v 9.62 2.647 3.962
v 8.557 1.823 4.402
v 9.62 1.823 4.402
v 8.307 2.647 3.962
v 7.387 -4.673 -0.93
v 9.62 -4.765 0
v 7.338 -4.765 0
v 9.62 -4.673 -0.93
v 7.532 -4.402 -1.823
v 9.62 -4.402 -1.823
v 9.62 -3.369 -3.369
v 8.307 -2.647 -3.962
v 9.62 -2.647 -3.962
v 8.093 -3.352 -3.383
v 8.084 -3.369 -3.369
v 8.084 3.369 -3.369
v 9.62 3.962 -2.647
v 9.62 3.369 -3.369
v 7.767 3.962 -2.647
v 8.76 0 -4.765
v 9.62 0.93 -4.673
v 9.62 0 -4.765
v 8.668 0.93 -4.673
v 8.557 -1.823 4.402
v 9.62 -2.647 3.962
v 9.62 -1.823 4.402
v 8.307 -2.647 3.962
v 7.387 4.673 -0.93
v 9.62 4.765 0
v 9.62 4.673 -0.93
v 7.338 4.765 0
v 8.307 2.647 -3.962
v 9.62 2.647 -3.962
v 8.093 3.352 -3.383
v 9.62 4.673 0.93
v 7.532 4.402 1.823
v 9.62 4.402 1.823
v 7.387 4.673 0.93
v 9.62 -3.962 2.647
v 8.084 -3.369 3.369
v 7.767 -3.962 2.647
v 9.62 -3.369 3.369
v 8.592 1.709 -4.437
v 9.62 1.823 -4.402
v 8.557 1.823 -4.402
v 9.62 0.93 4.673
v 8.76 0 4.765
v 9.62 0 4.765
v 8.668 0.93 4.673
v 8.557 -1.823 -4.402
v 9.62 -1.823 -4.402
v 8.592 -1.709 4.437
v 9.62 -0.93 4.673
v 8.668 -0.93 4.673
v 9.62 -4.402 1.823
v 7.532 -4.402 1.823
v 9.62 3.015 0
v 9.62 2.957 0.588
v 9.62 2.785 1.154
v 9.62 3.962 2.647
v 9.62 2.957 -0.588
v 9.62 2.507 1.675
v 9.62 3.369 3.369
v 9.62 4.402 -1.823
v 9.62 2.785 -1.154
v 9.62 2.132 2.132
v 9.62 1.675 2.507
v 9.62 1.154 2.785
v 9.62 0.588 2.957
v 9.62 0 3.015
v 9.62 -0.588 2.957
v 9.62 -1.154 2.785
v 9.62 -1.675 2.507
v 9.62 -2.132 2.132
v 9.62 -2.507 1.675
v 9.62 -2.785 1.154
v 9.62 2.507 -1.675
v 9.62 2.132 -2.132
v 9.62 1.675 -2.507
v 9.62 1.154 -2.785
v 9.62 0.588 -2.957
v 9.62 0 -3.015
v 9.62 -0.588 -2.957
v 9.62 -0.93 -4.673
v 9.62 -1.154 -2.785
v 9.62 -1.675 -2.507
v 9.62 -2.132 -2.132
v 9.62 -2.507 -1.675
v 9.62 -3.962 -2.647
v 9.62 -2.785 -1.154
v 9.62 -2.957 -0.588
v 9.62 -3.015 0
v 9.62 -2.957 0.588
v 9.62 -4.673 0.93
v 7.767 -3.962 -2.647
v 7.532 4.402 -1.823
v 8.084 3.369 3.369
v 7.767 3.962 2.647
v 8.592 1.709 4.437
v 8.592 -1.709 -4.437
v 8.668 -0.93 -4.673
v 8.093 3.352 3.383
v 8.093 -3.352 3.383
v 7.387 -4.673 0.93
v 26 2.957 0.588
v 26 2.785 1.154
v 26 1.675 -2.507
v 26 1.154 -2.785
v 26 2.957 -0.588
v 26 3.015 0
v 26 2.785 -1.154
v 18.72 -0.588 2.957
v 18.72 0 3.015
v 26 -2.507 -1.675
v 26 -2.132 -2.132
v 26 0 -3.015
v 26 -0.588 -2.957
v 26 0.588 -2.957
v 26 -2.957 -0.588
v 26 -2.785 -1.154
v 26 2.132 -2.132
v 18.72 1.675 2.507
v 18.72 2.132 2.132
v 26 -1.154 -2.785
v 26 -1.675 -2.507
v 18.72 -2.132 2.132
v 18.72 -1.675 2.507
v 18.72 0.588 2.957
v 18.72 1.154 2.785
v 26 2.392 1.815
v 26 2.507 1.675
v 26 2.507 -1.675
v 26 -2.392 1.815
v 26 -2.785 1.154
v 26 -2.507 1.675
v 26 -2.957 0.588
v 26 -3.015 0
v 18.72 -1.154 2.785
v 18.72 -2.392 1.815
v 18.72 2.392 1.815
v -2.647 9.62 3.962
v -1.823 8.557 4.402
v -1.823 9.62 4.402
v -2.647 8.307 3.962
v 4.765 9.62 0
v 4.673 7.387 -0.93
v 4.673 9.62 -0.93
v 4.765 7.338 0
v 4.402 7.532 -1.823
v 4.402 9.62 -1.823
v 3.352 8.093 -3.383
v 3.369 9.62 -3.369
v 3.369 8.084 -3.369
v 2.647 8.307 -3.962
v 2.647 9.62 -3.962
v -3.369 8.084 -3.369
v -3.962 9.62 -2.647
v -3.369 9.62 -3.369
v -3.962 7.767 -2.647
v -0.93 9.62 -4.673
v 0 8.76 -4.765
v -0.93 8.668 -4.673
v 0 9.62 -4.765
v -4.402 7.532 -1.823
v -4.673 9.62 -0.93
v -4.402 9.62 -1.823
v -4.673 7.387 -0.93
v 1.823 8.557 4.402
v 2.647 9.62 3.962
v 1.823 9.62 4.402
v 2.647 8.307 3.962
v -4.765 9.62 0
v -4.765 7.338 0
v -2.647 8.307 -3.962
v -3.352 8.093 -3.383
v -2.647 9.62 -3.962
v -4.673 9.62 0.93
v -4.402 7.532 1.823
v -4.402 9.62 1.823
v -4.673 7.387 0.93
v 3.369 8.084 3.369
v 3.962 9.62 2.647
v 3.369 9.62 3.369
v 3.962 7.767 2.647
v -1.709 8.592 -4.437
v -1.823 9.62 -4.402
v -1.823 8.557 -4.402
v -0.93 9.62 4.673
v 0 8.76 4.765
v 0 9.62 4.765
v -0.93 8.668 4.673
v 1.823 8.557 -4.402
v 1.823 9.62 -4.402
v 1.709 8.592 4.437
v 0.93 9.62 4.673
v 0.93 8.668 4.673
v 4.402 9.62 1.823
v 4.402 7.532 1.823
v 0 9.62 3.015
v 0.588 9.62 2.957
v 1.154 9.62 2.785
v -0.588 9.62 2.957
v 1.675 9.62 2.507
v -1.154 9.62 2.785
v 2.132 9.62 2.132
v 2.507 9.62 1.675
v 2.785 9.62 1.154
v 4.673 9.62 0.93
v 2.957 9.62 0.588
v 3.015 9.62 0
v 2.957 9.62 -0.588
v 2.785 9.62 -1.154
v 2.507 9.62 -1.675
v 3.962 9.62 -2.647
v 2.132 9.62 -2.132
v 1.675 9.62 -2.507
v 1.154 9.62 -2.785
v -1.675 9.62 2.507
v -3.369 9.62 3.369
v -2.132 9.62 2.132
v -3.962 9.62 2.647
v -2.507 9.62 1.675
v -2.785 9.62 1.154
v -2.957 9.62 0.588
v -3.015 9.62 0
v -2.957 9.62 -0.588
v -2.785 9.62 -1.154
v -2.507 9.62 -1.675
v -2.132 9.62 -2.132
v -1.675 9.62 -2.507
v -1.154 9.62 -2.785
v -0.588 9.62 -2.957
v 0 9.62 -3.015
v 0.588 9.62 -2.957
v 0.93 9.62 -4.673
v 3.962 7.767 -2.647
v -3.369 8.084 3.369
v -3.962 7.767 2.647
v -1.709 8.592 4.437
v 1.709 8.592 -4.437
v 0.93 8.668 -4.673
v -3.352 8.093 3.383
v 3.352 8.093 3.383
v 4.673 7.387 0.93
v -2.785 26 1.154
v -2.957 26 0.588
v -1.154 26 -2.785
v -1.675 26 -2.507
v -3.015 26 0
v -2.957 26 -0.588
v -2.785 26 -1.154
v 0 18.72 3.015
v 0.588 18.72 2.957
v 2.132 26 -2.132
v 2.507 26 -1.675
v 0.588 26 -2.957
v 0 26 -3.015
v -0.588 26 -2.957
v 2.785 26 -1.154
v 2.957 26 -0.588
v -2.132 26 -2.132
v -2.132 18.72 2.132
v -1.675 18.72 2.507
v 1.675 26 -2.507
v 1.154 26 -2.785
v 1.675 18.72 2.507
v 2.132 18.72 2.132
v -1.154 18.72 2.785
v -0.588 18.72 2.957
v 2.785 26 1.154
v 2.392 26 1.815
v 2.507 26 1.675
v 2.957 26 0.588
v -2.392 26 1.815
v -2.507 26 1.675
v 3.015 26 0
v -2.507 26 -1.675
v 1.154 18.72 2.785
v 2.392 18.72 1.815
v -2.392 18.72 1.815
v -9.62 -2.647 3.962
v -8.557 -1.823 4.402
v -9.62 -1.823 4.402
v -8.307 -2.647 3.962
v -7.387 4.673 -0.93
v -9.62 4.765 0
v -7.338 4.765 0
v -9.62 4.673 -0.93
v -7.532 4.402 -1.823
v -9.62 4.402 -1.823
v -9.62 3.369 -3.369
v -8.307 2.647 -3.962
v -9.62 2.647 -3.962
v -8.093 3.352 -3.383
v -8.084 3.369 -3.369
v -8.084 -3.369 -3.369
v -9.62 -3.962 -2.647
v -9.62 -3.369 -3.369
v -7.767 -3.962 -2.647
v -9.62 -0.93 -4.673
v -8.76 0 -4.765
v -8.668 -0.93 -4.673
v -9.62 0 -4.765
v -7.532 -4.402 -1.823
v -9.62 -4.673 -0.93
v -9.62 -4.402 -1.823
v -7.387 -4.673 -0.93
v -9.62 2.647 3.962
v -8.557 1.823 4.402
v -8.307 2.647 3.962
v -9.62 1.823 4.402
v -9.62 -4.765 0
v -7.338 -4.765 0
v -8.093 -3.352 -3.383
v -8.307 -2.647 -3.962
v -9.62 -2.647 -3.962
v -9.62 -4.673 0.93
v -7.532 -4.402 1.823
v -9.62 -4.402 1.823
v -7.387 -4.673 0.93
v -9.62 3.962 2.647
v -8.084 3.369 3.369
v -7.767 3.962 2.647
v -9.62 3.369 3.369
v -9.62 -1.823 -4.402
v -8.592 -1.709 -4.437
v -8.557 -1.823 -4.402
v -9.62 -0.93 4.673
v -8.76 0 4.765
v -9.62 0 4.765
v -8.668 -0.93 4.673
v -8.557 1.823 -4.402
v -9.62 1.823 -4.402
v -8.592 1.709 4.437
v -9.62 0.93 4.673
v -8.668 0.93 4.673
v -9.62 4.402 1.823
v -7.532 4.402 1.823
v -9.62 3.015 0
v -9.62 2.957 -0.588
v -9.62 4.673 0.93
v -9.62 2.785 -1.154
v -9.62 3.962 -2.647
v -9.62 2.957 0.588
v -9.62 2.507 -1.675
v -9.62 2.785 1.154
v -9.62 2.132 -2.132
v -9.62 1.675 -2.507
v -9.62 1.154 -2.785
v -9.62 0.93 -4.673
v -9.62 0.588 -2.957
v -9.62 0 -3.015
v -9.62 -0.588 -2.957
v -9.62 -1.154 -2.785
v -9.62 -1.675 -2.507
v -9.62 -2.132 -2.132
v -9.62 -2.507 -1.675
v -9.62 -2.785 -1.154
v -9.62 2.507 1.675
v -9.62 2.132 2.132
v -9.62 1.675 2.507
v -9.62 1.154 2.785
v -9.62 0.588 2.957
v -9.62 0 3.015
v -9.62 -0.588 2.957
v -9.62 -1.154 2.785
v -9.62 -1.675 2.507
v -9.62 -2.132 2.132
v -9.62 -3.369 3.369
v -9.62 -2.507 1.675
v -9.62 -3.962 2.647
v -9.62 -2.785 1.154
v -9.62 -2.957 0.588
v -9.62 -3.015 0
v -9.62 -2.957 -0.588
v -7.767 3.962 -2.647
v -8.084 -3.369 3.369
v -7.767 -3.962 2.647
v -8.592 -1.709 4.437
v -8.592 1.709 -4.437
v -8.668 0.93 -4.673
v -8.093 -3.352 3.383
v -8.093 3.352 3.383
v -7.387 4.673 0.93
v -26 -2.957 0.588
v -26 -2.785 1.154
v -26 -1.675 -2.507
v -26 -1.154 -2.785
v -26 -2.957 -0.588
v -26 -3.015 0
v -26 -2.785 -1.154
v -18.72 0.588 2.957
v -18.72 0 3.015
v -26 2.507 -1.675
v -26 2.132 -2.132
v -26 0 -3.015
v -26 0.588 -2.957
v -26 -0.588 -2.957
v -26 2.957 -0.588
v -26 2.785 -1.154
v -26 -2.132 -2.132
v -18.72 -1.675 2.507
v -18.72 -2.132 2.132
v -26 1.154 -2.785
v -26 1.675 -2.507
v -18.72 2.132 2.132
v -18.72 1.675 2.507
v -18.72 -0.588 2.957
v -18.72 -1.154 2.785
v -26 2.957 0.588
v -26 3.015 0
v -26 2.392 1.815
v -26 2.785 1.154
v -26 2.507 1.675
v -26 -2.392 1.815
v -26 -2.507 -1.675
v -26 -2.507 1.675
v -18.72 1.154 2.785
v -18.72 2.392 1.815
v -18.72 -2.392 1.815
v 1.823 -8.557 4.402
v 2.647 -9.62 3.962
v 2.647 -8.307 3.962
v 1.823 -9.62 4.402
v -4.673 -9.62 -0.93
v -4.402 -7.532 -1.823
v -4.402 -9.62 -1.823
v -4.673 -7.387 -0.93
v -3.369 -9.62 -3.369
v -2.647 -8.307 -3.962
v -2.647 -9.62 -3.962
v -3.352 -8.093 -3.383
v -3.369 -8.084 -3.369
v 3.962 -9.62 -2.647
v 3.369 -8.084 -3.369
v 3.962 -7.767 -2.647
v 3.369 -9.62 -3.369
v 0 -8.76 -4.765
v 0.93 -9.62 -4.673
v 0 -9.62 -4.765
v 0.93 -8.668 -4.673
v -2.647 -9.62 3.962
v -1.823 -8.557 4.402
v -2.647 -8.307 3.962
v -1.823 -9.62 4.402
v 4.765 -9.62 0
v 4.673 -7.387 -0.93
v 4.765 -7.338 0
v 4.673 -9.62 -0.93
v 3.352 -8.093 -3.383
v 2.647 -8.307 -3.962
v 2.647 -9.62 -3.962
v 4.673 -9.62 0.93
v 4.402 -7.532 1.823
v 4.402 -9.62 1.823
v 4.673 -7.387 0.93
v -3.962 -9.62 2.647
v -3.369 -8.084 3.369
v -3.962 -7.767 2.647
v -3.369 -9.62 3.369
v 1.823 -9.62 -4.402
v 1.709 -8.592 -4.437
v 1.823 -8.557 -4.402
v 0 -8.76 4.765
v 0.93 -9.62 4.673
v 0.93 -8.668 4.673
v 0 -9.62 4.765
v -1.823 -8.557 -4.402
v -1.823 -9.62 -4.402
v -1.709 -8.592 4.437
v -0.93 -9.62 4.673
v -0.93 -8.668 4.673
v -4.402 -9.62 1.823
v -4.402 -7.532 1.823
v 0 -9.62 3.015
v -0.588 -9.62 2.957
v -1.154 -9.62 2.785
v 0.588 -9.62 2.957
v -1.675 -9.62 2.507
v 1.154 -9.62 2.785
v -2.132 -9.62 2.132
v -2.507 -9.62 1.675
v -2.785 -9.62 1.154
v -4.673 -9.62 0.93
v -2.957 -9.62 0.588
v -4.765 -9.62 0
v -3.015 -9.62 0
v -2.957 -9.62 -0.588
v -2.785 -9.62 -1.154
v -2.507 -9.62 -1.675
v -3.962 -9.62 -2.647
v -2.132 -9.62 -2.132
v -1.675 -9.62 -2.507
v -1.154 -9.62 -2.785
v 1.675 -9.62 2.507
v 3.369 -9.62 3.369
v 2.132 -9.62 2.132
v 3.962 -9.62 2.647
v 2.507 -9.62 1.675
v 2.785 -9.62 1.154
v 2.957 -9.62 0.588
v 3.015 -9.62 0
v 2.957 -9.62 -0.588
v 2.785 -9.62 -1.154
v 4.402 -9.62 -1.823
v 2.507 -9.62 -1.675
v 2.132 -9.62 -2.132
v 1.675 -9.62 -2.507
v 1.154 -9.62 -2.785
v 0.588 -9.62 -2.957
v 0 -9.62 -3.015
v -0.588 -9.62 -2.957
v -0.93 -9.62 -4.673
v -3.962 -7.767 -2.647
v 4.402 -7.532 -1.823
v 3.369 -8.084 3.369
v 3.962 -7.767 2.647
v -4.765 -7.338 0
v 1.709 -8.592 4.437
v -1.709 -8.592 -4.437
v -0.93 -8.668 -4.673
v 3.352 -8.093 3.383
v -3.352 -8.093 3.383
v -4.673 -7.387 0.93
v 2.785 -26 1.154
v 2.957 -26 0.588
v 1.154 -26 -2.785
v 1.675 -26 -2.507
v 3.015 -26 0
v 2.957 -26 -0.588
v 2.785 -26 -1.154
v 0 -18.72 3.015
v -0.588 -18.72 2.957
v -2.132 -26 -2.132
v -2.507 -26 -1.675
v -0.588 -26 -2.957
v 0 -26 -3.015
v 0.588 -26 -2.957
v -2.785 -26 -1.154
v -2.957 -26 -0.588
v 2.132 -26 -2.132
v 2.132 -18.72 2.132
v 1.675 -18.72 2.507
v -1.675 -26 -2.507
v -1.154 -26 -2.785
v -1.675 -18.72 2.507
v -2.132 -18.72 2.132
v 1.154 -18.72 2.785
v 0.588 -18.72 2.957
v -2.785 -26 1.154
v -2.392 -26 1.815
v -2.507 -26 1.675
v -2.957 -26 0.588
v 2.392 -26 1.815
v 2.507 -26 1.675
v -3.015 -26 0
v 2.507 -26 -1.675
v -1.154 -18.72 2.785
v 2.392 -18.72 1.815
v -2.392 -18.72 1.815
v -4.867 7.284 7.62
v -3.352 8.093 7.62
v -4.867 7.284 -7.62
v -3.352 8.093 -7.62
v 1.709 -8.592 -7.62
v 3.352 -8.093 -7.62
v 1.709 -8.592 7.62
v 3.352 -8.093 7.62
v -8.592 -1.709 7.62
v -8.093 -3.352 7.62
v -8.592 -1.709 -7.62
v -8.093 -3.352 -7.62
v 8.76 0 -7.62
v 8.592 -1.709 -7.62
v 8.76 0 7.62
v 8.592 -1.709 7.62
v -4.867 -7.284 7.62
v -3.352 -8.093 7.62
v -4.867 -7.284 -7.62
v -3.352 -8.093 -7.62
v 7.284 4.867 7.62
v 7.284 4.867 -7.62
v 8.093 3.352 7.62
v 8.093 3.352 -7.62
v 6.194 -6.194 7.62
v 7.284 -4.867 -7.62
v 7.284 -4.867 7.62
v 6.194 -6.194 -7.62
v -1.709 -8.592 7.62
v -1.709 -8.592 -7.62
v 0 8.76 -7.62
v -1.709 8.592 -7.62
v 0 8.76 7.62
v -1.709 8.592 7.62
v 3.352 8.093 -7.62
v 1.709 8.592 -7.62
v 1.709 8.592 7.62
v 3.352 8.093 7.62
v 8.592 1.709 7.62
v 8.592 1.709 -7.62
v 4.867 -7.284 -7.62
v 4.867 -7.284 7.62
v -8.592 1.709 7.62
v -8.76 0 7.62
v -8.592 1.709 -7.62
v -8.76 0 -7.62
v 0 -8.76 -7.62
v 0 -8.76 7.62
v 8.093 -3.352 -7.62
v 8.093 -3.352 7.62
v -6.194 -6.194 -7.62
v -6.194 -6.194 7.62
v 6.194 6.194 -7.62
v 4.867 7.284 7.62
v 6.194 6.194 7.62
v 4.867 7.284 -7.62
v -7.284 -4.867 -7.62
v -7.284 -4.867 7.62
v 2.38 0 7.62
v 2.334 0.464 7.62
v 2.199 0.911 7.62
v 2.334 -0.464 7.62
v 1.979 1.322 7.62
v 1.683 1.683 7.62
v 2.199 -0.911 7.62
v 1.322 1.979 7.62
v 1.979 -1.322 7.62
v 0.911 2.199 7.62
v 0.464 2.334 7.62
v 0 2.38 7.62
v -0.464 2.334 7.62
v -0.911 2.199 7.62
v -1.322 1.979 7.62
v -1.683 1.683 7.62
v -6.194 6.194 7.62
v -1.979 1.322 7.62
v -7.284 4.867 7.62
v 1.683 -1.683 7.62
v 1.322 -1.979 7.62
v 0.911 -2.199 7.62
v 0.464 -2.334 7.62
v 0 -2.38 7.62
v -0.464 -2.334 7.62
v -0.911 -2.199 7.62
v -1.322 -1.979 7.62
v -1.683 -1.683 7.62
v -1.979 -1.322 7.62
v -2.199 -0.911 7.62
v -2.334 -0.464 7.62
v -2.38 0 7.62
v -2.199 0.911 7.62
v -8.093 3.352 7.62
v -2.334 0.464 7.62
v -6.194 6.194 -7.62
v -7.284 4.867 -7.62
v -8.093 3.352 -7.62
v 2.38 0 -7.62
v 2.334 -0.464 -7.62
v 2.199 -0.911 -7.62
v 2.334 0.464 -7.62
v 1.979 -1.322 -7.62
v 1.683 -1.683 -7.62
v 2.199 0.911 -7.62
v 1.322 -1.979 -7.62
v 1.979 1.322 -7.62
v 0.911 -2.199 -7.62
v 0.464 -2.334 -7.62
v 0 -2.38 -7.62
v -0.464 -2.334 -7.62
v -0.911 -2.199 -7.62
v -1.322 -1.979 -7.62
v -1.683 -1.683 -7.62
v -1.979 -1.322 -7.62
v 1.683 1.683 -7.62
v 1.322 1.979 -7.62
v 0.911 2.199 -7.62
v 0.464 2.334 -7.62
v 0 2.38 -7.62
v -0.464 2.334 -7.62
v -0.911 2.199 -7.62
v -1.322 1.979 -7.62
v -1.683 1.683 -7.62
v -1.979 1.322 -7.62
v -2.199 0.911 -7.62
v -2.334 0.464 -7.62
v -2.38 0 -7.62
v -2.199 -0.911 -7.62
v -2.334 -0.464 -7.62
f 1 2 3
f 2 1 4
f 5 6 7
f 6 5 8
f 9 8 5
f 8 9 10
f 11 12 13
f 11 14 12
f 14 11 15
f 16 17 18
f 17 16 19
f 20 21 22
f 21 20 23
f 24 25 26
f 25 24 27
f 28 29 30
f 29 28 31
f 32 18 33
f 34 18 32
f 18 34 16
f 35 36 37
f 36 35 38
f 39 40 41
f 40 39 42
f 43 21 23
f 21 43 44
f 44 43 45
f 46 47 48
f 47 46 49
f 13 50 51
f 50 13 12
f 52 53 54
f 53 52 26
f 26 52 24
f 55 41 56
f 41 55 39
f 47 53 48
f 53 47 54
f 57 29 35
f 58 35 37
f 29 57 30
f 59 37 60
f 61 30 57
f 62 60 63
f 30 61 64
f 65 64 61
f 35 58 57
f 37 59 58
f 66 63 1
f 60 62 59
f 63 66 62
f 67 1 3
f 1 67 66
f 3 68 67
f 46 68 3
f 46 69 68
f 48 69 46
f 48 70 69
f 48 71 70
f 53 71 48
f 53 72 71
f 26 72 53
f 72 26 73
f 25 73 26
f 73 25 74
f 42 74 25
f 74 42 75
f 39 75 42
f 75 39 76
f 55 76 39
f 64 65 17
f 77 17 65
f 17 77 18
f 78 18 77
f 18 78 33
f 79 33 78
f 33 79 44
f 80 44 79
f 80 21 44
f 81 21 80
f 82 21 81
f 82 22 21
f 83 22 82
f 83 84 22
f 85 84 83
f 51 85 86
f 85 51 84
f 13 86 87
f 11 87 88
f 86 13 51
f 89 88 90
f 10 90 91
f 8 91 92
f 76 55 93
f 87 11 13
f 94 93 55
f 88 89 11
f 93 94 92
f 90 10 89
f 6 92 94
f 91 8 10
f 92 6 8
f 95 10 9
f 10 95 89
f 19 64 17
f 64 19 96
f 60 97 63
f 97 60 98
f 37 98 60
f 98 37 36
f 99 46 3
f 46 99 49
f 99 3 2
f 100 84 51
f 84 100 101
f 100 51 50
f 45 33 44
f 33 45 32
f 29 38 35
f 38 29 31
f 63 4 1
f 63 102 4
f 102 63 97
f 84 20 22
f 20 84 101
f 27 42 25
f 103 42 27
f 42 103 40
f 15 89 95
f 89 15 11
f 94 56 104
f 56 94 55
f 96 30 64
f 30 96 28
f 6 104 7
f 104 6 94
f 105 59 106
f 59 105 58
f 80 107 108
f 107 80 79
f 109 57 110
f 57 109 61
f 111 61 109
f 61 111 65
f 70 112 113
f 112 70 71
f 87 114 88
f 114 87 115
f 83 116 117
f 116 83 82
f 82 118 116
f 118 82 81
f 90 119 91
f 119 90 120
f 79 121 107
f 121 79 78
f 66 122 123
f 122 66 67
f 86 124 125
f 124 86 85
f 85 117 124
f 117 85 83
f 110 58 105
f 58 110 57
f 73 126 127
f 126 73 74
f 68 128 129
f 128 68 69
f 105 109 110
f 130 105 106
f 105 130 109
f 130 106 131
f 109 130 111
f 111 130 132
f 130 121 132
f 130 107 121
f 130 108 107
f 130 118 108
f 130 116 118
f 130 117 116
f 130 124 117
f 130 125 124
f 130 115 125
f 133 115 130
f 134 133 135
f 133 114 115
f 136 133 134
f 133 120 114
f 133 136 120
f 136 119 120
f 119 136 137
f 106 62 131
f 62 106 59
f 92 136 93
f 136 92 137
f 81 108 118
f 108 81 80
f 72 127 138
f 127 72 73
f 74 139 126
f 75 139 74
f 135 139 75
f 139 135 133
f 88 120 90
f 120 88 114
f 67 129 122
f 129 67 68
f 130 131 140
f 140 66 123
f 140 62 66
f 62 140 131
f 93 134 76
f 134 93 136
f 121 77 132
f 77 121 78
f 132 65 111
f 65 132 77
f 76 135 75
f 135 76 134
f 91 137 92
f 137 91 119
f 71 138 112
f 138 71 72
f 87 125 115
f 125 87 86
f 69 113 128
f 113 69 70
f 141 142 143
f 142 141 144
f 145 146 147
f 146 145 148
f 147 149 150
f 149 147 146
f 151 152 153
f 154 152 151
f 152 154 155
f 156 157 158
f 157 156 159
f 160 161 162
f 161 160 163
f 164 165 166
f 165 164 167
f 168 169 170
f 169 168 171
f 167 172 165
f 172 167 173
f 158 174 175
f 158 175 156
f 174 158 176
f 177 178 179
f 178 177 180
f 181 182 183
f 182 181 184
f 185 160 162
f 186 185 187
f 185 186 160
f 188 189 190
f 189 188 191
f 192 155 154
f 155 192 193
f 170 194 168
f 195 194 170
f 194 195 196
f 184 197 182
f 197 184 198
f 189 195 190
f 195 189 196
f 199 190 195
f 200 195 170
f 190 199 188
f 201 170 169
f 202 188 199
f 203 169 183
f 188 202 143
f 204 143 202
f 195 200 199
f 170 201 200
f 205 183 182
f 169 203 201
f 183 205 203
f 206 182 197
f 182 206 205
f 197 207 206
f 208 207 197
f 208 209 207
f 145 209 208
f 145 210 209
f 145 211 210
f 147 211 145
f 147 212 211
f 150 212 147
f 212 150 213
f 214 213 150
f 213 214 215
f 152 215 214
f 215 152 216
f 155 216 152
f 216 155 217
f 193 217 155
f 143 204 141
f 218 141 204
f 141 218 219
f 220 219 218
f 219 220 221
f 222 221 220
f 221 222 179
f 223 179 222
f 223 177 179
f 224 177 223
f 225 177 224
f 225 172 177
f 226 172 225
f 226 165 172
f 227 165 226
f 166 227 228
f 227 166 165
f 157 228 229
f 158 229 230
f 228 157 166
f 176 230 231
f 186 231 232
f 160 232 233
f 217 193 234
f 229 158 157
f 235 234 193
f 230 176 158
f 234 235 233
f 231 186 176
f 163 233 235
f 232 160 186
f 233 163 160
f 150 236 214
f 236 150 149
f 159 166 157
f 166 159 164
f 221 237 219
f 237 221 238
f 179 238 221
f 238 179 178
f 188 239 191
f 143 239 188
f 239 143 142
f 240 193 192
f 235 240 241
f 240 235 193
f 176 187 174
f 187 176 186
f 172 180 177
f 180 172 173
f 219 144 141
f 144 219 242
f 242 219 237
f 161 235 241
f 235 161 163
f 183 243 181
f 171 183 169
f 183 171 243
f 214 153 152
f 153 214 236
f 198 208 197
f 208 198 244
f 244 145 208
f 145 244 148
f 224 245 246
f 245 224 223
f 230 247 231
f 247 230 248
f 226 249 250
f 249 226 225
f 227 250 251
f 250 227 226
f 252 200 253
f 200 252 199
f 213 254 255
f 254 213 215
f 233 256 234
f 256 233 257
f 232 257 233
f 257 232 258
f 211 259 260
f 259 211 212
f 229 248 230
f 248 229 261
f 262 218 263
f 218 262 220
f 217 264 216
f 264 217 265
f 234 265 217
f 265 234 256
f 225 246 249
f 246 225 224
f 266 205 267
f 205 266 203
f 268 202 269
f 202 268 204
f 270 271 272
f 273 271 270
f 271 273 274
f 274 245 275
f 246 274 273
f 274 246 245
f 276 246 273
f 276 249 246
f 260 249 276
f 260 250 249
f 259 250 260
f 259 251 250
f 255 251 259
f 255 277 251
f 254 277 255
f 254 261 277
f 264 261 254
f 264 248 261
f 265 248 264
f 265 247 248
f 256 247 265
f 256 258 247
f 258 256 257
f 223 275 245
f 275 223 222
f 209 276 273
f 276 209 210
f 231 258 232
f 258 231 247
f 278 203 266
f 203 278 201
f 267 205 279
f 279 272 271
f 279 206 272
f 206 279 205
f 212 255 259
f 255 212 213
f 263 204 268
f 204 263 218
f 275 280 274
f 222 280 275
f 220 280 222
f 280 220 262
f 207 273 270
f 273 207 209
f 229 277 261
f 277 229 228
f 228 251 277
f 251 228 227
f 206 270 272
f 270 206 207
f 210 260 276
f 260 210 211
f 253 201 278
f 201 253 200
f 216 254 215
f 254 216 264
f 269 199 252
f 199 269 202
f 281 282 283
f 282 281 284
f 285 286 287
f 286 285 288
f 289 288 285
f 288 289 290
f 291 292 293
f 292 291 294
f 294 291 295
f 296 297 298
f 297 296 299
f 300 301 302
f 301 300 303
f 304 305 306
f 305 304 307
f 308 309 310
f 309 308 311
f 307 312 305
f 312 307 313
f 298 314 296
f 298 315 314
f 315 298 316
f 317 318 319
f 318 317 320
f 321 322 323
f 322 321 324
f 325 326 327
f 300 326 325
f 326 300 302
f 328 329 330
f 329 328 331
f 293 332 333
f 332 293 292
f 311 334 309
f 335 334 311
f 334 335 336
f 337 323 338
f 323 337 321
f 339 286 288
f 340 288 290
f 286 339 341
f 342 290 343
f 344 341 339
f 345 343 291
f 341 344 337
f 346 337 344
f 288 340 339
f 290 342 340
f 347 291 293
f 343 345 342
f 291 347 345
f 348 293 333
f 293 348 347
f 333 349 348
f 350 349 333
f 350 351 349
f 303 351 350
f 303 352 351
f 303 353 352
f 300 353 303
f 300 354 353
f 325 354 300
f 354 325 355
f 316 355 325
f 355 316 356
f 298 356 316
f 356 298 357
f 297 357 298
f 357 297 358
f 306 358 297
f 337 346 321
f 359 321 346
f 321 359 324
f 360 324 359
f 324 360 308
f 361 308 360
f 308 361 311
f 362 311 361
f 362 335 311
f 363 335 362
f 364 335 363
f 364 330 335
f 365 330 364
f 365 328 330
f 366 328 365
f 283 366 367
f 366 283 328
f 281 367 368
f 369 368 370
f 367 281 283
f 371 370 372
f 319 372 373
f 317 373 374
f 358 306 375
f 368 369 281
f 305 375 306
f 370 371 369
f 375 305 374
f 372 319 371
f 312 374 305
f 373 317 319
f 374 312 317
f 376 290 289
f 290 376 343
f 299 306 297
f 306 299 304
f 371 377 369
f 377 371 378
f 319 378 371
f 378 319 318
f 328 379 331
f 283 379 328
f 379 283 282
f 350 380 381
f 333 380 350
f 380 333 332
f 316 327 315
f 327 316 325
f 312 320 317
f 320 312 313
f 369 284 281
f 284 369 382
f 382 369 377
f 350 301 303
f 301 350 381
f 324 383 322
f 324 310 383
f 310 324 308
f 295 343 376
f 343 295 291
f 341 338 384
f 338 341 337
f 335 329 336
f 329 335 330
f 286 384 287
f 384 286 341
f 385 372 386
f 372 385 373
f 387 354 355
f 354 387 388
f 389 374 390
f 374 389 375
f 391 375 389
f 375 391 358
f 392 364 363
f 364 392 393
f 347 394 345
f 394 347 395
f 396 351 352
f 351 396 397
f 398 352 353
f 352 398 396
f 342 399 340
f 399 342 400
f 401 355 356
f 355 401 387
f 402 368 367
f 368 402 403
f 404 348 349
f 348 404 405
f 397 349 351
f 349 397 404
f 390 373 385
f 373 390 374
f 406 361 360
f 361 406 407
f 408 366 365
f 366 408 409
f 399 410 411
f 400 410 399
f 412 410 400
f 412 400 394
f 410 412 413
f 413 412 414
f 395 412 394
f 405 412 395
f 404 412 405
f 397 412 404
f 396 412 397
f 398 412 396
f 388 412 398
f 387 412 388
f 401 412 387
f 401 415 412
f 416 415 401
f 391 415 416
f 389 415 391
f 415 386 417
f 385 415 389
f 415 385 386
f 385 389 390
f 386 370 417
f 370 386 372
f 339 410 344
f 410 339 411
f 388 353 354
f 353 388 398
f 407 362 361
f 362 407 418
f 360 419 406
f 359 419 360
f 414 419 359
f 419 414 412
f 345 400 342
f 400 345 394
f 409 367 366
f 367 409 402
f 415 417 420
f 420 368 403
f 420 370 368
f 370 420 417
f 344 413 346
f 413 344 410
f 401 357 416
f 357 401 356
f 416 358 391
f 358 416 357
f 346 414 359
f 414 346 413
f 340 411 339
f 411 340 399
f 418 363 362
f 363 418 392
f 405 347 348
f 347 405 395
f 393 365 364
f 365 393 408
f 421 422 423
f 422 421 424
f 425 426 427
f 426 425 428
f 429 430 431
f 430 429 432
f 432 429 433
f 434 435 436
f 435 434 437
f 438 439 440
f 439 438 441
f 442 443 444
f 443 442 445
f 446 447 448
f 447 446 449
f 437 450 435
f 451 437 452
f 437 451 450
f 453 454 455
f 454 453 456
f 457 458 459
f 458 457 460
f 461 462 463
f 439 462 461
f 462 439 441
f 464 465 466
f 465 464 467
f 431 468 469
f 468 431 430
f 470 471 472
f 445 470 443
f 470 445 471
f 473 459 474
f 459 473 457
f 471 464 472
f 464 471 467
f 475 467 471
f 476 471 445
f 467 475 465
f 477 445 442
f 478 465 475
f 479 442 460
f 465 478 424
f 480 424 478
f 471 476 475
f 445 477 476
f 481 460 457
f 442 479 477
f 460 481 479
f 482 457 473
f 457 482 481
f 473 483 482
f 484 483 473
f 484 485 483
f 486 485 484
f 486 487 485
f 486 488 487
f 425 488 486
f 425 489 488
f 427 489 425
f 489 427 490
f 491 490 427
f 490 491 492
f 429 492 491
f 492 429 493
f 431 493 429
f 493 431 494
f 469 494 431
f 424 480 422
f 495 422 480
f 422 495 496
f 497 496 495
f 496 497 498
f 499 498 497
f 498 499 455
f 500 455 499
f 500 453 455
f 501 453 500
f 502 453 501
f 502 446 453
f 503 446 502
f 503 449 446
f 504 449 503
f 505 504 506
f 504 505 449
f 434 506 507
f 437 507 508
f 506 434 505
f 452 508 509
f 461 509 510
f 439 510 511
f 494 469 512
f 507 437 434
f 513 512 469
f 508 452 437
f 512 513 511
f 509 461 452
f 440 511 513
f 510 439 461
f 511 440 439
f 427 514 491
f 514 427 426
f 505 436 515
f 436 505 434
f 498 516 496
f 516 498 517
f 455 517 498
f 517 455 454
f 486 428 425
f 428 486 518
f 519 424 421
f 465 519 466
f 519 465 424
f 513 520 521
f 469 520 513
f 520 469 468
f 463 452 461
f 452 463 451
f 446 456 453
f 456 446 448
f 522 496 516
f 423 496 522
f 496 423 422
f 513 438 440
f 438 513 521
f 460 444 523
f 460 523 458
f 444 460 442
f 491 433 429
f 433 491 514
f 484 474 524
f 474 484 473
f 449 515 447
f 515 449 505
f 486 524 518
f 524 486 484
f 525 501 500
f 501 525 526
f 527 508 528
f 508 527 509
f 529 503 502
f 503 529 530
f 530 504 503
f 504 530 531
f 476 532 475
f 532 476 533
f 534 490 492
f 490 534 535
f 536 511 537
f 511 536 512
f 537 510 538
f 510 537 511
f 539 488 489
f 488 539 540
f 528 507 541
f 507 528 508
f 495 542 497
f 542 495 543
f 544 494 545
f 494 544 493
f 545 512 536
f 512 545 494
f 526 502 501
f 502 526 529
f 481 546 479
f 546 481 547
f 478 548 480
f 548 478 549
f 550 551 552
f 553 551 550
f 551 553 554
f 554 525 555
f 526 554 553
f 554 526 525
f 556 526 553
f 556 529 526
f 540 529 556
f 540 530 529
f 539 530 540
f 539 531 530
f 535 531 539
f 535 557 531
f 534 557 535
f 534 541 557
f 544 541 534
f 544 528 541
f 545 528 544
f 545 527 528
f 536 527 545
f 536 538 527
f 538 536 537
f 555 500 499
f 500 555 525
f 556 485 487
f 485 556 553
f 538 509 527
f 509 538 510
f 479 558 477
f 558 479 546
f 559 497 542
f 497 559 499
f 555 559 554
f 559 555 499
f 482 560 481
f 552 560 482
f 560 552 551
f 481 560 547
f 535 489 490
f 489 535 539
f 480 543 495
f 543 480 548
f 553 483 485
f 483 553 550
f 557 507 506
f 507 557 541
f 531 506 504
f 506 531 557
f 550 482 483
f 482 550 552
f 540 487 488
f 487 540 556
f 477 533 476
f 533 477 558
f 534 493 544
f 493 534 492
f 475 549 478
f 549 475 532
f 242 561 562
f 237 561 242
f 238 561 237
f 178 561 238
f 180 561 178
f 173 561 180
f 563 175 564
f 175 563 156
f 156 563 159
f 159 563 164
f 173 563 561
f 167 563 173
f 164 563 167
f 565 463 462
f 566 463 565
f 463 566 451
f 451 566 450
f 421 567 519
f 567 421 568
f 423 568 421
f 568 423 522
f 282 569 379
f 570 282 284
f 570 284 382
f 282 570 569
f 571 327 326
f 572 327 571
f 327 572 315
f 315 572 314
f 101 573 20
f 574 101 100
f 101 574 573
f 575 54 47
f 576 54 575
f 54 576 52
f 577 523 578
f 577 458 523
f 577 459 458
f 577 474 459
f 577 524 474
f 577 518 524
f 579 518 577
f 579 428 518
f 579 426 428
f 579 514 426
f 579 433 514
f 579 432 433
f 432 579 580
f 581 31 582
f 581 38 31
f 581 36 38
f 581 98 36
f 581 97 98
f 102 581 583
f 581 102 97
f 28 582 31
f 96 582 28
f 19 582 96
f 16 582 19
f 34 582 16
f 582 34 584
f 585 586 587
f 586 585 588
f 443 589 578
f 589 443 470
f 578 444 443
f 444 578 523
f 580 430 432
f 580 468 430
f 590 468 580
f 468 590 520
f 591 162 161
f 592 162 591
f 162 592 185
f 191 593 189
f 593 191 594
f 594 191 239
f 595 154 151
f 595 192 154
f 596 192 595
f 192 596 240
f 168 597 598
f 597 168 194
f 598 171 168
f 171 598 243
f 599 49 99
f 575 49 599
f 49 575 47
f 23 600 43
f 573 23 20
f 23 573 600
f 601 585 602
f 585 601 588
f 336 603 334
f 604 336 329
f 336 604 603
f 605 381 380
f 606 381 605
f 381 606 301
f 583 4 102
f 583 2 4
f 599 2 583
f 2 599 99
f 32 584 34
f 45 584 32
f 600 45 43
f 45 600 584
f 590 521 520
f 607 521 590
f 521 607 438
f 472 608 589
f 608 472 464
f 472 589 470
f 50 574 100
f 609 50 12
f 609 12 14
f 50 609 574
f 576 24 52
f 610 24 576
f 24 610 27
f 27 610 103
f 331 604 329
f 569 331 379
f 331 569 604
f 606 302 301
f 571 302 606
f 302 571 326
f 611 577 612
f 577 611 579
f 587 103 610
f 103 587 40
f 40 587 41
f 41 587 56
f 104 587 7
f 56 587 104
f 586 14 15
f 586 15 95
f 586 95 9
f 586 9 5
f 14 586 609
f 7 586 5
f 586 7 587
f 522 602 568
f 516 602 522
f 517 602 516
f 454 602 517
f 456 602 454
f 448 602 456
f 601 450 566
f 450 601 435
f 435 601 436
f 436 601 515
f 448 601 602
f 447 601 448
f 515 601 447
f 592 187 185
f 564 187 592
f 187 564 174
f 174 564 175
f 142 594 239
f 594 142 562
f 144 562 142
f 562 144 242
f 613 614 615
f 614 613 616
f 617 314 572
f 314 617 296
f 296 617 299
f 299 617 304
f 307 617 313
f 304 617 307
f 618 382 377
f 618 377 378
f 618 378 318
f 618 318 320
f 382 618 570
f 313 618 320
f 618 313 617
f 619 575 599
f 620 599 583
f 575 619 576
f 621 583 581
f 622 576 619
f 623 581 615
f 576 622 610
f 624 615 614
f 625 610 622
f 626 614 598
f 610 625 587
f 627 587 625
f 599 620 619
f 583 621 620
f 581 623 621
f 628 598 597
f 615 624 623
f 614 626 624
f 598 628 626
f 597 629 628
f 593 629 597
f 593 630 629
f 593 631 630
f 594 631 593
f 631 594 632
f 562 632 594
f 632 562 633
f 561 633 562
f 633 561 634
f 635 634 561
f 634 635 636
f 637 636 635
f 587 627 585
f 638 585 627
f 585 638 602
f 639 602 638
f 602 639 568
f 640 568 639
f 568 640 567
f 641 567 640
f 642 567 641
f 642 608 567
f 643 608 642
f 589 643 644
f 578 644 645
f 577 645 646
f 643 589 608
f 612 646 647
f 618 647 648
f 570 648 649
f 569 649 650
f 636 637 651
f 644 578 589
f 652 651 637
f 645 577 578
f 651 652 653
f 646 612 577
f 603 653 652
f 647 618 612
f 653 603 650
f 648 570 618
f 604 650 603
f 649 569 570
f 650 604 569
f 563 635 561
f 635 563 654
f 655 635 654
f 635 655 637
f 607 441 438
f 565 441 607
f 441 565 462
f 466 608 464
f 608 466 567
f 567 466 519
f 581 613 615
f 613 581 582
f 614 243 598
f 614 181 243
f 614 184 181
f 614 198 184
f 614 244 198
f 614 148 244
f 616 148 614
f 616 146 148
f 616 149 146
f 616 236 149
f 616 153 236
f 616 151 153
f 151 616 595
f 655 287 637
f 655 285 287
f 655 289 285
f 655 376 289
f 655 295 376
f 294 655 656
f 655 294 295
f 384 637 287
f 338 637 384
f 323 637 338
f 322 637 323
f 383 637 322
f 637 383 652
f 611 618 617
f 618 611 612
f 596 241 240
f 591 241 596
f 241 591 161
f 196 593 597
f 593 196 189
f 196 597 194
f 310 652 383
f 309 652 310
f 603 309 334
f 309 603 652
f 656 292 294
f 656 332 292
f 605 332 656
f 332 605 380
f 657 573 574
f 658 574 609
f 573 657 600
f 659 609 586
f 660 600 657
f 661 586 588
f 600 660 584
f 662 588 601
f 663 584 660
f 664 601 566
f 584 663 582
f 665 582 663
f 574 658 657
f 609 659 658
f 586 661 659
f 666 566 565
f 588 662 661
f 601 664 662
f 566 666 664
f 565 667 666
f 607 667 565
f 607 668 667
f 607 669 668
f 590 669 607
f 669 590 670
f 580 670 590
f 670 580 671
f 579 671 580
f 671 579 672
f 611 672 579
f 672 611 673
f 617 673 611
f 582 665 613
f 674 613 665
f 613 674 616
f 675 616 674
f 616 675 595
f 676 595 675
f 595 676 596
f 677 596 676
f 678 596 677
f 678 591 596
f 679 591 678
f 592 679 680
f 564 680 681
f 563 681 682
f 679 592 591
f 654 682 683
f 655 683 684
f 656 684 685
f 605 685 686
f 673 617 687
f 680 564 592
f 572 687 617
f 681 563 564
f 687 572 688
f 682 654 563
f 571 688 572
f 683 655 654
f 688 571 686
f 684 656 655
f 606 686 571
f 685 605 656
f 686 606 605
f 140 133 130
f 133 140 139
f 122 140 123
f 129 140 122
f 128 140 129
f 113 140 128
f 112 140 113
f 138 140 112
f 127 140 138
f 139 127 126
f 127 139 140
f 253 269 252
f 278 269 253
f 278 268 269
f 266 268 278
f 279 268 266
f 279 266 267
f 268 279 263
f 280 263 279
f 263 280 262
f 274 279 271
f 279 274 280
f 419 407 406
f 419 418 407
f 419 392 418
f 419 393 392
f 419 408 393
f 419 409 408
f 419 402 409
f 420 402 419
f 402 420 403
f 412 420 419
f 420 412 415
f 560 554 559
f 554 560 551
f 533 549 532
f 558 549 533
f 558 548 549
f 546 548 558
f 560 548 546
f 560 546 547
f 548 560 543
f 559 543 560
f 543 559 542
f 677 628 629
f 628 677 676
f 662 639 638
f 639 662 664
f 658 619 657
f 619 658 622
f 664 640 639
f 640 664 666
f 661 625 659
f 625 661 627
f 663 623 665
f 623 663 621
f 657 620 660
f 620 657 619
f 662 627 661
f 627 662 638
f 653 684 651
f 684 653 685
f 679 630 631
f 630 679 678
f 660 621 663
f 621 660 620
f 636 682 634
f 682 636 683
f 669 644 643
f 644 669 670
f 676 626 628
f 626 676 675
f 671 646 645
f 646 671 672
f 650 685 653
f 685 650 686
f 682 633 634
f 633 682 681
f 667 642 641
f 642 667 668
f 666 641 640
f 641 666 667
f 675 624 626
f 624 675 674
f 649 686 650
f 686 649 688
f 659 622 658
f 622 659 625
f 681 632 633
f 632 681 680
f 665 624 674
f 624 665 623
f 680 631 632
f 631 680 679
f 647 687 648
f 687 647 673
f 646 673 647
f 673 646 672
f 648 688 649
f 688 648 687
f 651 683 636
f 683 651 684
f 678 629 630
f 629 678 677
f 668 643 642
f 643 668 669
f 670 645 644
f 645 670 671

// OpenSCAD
$fn = 32;

// ----------------------------------------------------------------------
// Cardan cross: 52 mm span, 9.53 mm trunnions
// ----------------------------------------------------------------------

// --- parameters (mm) ---
journal_d = 9.53;         // trunnion diameter
arm_len = 26;             // trunnion length from the centre
step_r = 3.24;            // step position from the centre
step_d = 6.03;            // journal diameter after the step
hub_d = 17.52;            // hub diameter
hub_h = 15.24;            // hub height
bore_d = 4.76;            // hub bore
flat_d = 1.2;             // depth of the journal flat
flat_len = 7.28;          // length of the journal flat

difference() {
  union() {
    /* hub along the joint axis */
    cylinder(h = hub_h, d = hub_d, center = true);
    for (a = [0 : 90 : 270]) rotate([0, 0, a]) {
      /* trunnion, sunk into the hub */
      translate([hub_d / 4, 0, 0]) rotate([0, 90, 0]) cylinder(h = step_r + 2, d = journal_d);
      /* stepped journal out to the tip */
      translate([step_r - 0.5, 0, 0]) rotate([0, 90, 0]) cylinder(h = arm_len + 0.5 - step_r, d = step_d);
    }
  }
  /* lubrication bore through the hub, 2.5 mm clear on both sides */
  translate([0, 0, -hub_h / 2 - 2.5]) cylinder(h = hub_h + 5, d = bore_d);
  /* machined flat on each journal tip */
  for (a = [0 : 90 : 270]) rotate([0, 0, a]) {
    translate([arm_len - flat_len, -step_d, step_d / 2 - flat_d]) cube([flat_len + 0.5, 2 * step_d, flat_d + 2.5]);
  }
}
